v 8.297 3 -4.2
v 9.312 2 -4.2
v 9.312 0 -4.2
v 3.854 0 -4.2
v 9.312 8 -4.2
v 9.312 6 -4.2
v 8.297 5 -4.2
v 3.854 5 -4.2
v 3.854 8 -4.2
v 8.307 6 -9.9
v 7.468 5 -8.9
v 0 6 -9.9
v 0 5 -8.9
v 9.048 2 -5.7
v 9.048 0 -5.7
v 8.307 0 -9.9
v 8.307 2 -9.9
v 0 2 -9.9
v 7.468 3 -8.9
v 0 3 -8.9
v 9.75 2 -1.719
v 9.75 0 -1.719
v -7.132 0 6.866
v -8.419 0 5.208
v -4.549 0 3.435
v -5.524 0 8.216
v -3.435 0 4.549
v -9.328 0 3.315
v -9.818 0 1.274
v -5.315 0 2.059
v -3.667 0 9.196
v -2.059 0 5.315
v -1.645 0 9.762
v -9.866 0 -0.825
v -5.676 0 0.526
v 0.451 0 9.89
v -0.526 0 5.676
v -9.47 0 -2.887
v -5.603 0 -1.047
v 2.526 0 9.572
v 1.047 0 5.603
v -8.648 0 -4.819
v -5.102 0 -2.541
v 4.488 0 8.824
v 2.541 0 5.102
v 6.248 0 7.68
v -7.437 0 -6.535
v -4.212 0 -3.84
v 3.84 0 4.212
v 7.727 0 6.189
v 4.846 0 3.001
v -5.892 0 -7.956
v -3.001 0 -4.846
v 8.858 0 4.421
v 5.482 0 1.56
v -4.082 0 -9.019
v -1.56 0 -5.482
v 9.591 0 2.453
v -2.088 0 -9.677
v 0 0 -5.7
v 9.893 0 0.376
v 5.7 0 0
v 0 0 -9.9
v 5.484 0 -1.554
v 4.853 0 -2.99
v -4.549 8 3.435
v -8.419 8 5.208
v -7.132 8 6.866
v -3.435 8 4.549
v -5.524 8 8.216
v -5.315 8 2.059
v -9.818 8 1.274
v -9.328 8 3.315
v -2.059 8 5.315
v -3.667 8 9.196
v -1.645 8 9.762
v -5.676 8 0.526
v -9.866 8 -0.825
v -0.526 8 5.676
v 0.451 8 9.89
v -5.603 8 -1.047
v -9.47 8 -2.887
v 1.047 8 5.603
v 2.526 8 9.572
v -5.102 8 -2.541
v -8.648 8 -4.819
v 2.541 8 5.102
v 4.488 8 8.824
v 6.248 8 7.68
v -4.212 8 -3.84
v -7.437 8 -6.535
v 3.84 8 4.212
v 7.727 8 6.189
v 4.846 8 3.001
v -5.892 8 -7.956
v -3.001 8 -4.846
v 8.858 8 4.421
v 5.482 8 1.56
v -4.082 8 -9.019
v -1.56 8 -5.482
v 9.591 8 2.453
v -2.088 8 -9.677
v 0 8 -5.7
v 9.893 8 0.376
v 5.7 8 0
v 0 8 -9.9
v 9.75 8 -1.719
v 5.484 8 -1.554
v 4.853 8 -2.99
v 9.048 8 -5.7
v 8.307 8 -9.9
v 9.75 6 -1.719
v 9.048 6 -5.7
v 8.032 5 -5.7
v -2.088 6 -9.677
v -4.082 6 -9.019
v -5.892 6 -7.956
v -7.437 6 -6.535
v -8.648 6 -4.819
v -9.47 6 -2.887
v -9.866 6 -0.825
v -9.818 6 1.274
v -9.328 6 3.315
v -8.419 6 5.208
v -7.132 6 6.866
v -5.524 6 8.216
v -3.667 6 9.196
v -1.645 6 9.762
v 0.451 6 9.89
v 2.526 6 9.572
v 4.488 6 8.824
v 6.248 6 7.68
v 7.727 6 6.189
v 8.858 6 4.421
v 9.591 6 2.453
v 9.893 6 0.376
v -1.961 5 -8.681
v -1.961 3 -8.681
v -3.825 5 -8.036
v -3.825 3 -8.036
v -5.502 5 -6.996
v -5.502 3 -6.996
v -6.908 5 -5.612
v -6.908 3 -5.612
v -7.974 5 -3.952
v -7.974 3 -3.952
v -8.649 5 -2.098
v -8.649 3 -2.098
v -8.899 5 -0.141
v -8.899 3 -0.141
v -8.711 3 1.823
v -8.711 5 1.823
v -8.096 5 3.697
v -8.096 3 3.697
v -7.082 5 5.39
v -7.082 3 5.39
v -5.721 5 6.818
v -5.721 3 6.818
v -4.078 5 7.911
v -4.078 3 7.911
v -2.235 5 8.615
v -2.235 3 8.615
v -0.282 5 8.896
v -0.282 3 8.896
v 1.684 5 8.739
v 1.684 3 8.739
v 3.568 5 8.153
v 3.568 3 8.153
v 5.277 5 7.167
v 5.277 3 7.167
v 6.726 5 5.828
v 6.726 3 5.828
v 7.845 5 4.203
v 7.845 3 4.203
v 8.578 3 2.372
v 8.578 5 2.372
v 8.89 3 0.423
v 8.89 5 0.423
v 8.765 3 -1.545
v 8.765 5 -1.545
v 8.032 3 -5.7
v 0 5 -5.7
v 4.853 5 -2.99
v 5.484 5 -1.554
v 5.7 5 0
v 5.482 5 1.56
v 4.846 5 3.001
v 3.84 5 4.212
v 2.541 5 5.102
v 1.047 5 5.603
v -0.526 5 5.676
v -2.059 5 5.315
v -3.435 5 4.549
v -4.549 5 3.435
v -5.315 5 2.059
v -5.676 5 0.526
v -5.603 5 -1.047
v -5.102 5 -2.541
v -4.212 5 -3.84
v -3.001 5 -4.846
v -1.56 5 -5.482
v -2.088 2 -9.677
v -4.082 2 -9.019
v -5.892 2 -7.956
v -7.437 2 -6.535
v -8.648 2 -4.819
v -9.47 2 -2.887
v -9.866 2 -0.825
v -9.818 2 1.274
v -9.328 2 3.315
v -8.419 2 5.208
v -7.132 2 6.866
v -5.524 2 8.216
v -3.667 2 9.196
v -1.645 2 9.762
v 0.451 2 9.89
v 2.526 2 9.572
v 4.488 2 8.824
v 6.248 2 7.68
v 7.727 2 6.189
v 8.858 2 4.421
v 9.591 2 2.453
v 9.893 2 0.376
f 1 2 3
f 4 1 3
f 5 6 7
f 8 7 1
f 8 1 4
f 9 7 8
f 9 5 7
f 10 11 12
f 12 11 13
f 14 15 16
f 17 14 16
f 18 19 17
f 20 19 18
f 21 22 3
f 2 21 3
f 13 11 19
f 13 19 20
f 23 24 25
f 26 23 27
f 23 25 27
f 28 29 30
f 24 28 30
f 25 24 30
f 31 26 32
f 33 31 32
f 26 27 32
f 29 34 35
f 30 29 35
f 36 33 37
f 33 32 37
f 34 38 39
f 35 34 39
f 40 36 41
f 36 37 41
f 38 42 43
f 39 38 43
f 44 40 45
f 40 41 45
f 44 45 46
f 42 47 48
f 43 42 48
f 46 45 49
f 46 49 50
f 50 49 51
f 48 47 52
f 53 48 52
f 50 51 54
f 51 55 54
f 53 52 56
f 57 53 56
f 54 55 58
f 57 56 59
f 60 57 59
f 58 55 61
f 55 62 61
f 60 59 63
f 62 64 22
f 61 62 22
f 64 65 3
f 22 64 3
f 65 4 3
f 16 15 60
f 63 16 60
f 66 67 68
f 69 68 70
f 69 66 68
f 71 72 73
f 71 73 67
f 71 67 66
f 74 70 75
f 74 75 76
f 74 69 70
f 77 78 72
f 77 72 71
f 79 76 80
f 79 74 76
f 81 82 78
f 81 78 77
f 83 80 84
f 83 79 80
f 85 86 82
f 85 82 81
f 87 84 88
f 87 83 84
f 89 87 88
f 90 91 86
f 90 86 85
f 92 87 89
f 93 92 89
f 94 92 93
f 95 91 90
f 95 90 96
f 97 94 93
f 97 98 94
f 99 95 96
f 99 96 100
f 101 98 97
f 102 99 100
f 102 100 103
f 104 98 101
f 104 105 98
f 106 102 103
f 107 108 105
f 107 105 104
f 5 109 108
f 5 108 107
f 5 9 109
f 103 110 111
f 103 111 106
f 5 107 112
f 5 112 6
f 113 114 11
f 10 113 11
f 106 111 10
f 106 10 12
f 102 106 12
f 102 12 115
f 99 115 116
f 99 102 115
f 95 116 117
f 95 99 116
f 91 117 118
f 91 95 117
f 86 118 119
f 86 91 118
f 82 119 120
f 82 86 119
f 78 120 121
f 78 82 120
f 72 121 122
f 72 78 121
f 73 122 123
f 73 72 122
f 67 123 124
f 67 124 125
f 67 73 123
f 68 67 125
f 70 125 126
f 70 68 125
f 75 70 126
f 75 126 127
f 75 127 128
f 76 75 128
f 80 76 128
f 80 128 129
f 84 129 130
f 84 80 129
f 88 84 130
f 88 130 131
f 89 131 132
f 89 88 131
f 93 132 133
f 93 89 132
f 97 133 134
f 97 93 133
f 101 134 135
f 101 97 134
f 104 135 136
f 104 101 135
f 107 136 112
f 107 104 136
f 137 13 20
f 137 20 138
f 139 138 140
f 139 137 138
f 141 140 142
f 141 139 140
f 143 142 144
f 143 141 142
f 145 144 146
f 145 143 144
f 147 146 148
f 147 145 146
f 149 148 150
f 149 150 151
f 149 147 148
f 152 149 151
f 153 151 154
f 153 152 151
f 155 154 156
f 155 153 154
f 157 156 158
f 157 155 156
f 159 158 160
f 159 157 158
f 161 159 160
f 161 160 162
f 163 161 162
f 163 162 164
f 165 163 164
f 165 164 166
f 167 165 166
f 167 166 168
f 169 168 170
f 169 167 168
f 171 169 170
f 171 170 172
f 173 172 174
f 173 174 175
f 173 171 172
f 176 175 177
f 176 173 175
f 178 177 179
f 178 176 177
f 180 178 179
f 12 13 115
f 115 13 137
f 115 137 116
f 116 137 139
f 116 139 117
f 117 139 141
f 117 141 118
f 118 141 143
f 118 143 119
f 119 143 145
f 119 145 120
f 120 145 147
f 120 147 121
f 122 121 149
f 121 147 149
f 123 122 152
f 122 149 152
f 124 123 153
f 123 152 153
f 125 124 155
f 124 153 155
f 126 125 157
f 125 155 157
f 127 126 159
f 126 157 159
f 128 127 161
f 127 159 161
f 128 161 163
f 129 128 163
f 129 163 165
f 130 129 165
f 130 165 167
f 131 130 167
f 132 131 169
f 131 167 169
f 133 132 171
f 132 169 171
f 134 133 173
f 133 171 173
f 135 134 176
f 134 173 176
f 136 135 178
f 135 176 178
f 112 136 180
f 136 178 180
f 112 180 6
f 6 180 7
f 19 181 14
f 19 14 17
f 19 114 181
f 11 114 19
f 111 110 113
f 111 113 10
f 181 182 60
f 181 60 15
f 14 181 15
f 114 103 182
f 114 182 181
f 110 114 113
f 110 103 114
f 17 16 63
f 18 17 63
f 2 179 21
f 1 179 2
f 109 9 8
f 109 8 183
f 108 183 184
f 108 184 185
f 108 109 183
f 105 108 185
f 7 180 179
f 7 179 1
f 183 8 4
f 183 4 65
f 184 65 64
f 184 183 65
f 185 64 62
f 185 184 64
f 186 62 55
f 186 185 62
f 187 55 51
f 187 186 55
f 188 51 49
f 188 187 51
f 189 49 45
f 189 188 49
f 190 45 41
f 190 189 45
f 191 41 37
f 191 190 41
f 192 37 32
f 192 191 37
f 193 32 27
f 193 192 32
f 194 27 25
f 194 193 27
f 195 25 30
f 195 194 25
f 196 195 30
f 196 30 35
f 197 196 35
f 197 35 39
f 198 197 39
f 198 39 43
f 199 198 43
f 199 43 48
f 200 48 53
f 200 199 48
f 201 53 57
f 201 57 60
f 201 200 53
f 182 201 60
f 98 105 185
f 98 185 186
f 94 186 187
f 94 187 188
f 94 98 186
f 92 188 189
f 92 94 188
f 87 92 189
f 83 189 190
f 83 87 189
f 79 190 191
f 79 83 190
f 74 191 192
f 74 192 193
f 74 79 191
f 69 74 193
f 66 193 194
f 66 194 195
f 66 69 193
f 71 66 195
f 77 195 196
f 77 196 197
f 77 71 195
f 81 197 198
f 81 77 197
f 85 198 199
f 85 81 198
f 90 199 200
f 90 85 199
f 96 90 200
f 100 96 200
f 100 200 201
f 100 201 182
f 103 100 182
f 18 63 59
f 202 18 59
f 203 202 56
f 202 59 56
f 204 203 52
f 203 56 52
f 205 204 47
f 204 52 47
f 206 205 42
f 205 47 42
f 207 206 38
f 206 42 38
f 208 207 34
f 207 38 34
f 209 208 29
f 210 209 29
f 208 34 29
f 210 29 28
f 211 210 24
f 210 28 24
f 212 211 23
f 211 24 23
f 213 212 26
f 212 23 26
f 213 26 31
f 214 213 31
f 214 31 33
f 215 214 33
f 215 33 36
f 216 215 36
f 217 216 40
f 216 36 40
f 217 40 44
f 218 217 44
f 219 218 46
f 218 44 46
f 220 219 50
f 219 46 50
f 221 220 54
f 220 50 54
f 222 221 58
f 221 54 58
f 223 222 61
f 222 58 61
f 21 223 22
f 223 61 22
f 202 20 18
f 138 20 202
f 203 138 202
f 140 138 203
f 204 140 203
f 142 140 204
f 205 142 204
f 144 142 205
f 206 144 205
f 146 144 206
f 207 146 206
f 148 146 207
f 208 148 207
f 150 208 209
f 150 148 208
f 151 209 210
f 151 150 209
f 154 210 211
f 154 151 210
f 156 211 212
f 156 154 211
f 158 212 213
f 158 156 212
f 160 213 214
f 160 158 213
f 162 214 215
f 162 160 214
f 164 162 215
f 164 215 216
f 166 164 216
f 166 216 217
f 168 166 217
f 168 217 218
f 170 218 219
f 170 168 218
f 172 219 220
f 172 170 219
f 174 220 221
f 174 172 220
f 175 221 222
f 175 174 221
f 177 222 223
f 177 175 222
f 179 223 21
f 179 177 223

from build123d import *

# Parameters (mm, degrees)
BOSS_EXTRUDE1_DEPTH = 3
CHAMFER1_SIZE       = 1
BOSS_EXTRUDE2_DEPTH = 1


with BuildPart() as part:
    # Sketch1 → Boss-Extrude1 (new body)
    with BuildSketch(Plane(origin=(0, 0, 0), x_dir=(1, 0, 0), z_dir=(0, 1, 0))):
        with BuildLine():
            Line((8.307086349, 9.9), (0, 9.9))
            ThreePointArc((0, 9.9), (-6.363597336, -7.583839987), (9.749596755, 1.719116959))
            Line((9.749596755, 1.719116959), (9.312150139, 4.2))
            Line((9.312150139, 4.2), (3.853569774, 4.2))
            ThreePointArc((3.853569774, 4.2), (5.218014359, 2.293976056), (5.7, 0))
            ThreePointArc((5.7, 0), (-4.030508653, -4.030508653), (0, 5.7))
            Line((0, 5.7), (9.047659668, 5.7))
            Line((9.047659668, 5.7), (8.307086349, 9.9))
        make_face()
    extrude(amount=BOSS_EXTRUDE1_DEPTH)

    # Chamfer1
    chamfer1_edges = [part.edges().sort_by_distance(p)[0] for p in [
        (-6.363597336, 3, 7.583839987),
        (9.530873447, 3, -2.959558479),
        (8.677373008, 3, -7.8),
        (4.153543174, 3, -9.9),
    ]]
    chamfer(chamfer1_edges, length=CHAMFER1_SIZE)

    # Sketch3 → Boss-Extrude2 (add)
    with BuildSketch(Plane(origin=(0, 3, 0), x_dir=(1, 0, 0), z_dir=(0, 1, 0))):
        with BuildLine():
            Line((0, 5.7), (8.032233056, 5.7))
            Line((8.032233056, 5.7), (7.467986717, 8.9))
            Line((7.467986717, 8.9), (0, 8.9))
            ThreePointArc((0, 8.9), (-5.720809726, -6.817795544), (8.764789002, 1.545468781))
            Line((8.764789002, 1.545468781), (8.296723527, 4.2))
            Line((8.296723527, 4.2), (3.853569774, 4.2))
            ThreePointArc((3.853569774, 4.2), (-2.067607313, -5.311779363), (0, 5.7))
        make_face()
    extrude(amount=BOSS_EXTRUDE2_DEPTH)

    # Mirror1: part across plane


with BuildPart() as part_1:
    add(part.part)
    add(part.part.mirror(Plane.ZX.offset(4)))


solid = part_1.part
